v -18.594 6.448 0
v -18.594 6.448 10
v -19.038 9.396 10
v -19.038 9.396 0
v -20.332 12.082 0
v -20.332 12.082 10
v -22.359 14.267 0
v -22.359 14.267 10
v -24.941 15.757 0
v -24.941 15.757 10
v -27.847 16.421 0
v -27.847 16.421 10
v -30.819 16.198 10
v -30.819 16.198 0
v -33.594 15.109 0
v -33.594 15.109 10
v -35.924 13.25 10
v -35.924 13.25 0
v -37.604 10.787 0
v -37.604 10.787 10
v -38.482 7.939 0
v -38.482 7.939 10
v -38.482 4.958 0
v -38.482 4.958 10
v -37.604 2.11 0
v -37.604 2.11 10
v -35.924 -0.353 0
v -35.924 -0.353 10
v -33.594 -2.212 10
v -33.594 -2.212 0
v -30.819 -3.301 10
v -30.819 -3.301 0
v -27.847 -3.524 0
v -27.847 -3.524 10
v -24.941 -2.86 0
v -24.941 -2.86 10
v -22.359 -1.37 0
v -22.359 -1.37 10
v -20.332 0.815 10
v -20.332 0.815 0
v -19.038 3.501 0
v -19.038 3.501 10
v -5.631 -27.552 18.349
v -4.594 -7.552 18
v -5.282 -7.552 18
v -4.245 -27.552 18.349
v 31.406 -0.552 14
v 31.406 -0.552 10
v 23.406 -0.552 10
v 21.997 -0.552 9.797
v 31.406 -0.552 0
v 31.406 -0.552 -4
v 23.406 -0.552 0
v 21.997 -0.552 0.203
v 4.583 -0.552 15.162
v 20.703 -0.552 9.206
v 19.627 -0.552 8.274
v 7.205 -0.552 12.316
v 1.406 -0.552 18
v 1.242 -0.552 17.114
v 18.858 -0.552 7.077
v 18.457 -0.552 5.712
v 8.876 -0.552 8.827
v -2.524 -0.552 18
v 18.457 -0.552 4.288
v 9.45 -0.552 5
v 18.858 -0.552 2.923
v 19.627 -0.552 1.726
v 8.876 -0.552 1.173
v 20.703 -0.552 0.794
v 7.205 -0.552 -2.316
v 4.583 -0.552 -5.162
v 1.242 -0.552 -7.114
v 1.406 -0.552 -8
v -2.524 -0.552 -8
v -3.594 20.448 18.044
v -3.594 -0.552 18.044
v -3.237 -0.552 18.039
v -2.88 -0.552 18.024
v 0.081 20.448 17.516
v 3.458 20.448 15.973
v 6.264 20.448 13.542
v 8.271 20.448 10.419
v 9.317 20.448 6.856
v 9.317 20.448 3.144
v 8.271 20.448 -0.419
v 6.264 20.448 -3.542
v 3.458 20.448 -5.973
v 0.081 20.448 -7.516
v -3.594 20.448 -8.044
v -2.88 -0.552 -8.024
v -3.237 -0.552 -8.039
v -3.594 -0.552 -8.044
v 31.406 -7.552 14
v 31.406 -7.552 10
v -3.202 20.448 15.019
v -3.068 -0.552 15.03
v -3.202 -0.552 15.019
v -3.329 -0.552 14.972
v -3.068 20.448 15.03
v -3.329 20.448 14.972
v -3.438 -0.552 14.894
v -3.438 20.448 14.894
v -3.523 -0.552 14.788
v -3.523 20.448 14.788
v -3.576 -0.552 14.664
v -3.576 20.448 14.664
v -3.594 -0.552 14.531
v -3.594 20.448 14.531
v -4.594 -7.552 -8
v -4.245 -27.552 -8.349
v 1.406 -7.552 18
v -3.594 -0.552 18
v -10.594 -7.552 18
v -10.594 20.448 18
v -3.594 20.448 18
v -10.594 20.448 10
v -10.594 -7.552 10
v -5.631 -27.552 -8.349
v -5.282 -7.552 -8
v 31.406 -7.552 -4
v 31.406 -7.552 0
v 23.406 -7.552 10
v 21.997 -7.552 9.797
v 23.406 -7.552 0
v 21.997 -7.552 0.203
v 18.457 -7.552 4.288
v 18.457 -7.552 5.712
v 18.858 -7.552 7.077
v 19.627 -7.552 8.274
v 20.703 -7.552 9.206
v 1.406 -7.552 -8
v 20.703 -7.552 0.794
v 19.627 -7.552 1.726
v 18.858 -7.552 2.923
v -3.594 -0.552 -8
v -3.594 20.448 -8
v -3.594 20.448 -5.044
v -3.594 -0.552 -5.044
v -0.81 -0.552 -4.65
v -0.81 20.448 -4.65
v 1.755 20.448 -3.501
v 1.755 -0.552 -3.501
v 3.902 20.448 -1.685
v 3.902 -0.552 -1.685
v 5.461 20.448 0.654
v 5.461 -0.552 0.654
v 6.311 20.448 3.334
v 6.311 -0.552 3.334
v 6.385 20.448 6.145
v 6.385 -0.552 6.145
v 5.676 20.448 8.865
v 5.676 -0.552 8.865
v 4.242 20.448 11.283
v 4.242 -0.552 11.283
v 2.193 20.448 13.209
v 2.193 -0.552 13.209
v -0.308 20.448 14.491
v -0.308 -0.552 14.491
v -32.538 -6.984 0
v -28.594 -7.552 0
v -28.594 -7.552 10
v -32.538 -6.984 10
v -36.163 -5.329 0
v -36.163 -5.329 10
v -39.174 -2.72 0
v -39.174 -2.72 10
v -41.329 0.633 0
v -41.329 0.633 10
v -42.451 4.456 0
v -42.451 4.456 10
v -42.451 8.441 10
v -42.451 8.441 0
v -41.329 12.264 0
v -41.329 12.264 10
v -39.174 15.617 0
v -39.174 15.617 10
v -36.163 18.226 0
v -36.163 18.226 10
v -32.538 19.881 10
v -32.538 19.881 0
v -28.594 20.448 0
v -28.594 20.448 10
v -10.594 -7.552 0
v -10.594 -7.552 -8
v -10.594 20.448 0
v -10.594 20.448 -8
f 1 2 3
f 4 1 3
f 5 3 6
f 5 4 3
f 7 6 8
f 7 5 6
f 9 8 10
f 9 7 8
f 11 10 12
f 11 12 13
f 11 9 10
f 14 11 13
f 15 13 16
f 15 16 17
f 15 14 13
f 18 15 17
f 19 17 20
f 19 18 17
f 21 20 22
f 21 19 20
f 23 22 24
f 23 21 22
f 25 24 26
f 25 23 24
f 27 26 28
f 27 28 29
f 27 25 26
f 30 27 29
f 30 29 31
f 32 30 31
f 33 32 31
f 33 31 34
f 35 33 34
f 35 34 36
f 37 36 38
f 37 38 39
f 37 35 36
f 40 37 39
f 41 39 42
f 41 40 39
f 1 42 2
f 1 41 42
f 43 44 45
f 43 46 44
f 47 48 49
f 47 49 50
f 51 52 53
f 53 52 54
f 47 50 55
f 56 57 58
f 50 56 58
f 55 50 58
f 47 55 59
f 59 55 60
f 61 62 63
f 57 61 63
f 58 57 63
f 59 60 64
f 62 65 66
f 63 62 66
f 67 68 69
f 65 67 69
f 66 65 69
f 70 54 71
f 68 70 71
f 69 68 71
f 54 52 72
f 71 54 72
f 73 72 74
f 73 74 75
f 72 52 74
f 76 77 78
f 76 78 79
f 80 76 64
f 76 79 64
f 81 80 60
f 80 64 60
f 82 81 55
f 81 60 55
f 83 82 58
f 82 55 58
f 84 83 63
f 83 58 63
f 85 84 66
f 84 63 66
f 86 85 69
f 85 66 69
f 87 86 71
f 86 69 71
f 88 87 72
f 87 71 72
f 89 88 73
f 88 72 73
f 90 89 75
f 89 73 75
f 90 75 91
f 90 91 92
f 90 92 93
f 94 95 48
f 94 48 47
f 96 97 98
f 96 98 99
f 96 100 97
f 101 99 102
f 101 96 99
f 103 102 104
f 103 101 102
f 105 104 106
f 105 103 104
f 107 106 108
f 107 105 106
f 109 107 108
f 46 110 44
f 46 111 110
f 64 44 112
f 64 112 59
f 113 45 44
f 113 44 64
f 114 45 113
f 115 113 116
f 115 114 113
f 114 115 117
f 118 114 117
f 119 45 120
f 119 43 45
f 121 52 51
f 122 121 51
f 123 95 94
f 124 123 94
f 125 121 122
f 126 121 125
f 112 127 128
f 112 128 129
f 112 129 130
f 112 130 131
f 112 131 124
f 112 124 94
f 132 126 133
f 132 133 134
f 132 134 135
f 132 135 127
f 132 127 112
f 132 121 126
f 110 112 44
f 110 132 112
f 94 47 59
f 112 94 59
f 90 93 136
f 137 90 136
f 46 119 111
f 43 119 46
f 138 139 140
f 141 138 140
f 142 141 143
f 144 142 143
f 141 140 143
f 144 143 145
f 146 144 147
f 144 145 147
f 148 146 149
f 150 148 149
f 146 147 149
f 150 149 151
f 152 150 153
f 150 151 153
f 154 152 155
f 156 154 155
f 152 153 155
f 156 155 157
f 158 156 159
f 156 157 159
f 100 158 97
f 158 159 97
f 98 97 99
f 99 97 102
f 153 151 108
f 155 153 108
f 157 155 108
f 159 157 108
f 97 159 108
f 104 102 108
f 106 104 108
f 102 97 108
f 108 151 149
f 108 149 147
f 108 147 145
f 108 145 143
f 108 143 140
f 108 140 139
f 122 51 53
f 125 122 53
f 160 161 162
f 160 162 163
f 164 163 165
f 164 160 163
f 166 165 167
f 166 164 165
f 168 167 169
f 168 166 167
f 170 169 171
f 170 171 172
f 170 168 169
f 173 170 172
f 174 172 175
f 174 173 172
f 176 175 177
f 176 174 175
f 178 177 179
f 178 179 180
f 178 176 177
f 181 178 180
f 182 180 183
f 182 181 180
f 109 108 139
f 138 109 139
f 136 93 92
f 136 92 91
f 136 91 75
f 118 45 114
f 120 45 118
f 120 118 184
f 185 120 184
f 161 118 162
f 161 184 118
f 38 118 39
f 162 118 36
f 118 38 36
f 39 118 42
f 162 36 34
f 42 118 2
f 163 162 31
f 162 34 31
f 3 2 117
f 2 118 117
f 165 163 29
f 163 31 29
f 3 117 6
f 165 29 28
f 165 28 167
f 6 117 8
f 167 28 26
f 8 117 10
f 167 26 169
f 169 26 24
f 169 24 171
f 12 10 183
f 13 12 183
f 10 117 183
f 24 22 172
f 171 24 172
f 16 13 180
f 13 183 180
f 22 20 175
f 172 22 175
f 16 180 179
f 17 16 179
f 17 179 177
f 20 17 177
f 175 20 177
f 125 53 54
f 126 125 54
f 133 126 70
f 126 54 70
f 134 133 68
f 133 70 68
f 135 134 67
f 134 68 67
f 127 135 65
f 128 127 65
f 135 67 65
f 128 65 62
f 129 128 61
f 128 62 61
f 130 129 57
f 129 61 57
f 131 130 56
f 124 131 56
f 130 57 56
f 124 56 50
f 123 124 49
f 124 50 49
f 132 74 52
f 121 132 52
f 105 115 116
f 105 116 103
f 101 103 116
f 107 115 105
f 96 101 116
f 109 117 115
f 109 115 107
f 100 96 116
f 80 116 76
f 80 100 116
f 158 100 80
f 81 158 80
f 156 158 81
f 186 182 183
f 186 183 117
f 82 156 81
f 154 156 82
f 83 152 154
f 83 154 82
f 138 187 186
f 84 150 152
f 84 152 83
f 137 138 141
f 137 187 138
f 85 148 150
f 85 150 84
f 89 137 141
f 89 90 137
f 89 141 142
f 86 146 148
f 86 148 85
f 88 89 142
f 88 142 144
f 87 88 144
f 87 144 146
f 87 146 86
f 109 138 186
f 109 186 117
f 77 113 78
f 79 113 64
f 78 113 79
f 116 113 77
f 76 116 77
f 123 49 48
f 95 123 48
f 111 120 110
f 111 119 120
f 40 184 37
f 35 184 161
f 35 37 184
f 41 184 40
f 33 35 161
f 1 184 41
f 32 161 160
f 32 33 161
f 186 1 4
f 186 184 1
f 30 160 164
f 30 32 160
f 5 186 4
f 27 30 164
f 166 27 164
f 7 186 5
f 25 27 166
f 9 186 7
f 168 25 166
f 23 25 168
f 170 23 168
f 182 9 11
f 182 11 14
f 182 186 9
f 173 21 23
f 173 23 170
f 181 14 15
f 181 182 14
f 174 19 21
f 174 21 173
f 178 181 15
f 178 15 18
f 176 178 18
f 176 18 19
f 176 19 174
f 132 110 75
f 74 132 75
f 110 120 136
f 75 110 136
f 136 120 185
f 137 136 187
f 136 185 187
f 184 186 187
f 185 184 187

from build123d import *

# Parameters (mm, degrees)
SZKIC1_R                              = 10
DODANIE_WYCI_GNI_CIE1_DEPTH           = 10
DODANIE_WYCI_GNI_CIE2_DEPTH           = 7
SZKIC3_W                              = 26
SZKIC3_H                              = 7
DODANIE_WYCI_GNI_CIE3_DEPTH           = 5
DODANIE_WYCI_GNI_CIE4_DEPTH           = 7
DODANIE_WYCI_GNI_CIE5_DEPTH           = 21
ZAOKR_GLENIE2_R                       = 0.5
SZKIC8_W                              = 0.687995553
SZKIC8_H                              = 26
DODANIE_WYCI_GNI_CIE6_DEPTH           = 20
DODANIE_WYCI_GNI_CIE6_TAPER           = -1
DODANIE_WYCI_GNI_CIE6_OTHER_WAY_DEPTH = 10


with BuildPart() as part:
    # Szkic1 → Dodanie-wyciągnięcie1 (new body)
    with BuildSketch(Plane.XY):
        with BuildLine():
            Line((-10.593939394, 20.448484848), (-10.593939394, -7.551515152))
            Line((-10.593939394, -7.551515152), (-28.593939394, -7.551515152))
            ThreePointArc((-28.593939394, -7.551515152), (-42.593939394, 6.448484848), (-28.593939394, 20.448484848))
            Line((-28.593939394, 20.448484848), (-10.593939394, 20.448484848))
        make_face()
        with Locations((-28.593939394, 6.448484848)):
            Circle(SZKIC1_R, mode=Mode.SUBTRACT)
    extrude(amount=DODANIE_WYCI_GNI_CIE1_DEPTH)

    # Szkic2 → Dodanie-wyciągnięcie2 (add)
    with BuildSketch(Plane(origin=(-10.593939394, 0, 0), x_dir=(0, 0, -1), z_dir=(1, 0, 0))):
        Polygon((-10, 20.448484848), (-18, 20.448484848), (-18, -7.551515152), (-10, -7.551515152), (0, -7.551515152), (8, -7.551515152), (8, 20.448484848), (0, 20.448484848), align=None)
    extrude(amount=DODANIE_WYCI_GNI_CIE2_DEPTH)

    # Szkic3 → Dodanie-wyciągnięcie3 (add)
    with BuildSketch(Plane(origin=(-3.593939394, 0, 0), x_dir=(0, 0, -1), z_dir=(1, 0, 0))):
        with Locations((-5, -4.051515152)):
            Rectangle(SZKIC3_W, SZKIC3_H)
    extrude(amount=DODANIE_WYCI_GNI_CIE3_DEPTH)

    # Szkic4 → Dodanie-wyciągnięcie4 (add)
    with BuildSketch(Plane(origin=(0, -0.551515152, 0), x_dir=(1, 0, 0), z_dir=(0, 1, 0))):
        with BuildLine():
            Line((1.406060606, -18), (1.406060606, 8))
            Line((1.406060606, 8), (31.406060606, 4))
            Line((31.406060606, 4), (31.406060606, 0))
            Line((31.406060606, 0), (23.406060606, 0))
            ThreePointArc((23.406060606, 0), (18.406060606, -5), (23.406060606, -10))
            Line((23.406060606, -10), (31.406060606, -10))
            Line((31.406060606, -10), (31.406060606, -14))
            Line((31.406060606, -14), (1.406060606, -18))
        make_face()
    extrude(amount=-DODANIE_WYCI_GNI_CIE4_DEPTH)

    # Szkic5 → Dodanie-wyciągnięcie5 (add)
    with BuildSketch(Plane(origin=(0, -0.551515152, 0), x_dir=(1, 0, 0), z_dir=(0, 1, 0))):
        with BuildLine():
            Line((-3.593939394, 8.043944751), (-3.593939394, 5.043944751))
            ThreePointArc((-3.593939394, 5.043944751), (6.450005357, -5), (-3.593939394, -15.043944751))
            Line((-3.593939394, -15.043944751), (-3.593939394, -18.043944751))
            ThreePointArc((-3.593939394, -18.043944751), (9.450005357, -5), (-3.593939394, 8.043944751))
        make_face()
    extrude(amount=DODANIE_WYCI_GNI_CIE5_DEPTH)

    # Zaokrąglenie2
    zaokr_glenie2_edges = [part.edges().sort_by_distance(p)[0] for p in [
        (-3.593939394, 9.948484848, 15.043944751),
    ]]
    fillet(zaokr_glenie2_edges, radius=ZAOKR_GLENIE2_R)

    # Szkic8 → Dodanie-wyciągnięcie6 (add)
    with BuildSketch(Plane.XZ.offset(7.551515152)):
        with Locations((-4.937937171, 5)):
            Rectangle(SZKIC8_W, SZKIC8_H)
    extrude(amount=DODANIE_WYCI_GNI_CIE6_DEPTH, taper=DODANIE_WYCI_GNI_CIE6_TAPER)

    # Szkic8 → Dodanie-wyciągnięcie6 other way (add)
    with BuildSketch(Plane.XZ.offset(7.551515152)):
        with Locations((-4.937937171, 5)):
            Rectangle(SZKIC8_W, SZKIC8_H)
    extrude(amount=-DODANIE_WYCI_GNI_CIE6_OTHER_WAY_DEPTH)


solid = part.part
